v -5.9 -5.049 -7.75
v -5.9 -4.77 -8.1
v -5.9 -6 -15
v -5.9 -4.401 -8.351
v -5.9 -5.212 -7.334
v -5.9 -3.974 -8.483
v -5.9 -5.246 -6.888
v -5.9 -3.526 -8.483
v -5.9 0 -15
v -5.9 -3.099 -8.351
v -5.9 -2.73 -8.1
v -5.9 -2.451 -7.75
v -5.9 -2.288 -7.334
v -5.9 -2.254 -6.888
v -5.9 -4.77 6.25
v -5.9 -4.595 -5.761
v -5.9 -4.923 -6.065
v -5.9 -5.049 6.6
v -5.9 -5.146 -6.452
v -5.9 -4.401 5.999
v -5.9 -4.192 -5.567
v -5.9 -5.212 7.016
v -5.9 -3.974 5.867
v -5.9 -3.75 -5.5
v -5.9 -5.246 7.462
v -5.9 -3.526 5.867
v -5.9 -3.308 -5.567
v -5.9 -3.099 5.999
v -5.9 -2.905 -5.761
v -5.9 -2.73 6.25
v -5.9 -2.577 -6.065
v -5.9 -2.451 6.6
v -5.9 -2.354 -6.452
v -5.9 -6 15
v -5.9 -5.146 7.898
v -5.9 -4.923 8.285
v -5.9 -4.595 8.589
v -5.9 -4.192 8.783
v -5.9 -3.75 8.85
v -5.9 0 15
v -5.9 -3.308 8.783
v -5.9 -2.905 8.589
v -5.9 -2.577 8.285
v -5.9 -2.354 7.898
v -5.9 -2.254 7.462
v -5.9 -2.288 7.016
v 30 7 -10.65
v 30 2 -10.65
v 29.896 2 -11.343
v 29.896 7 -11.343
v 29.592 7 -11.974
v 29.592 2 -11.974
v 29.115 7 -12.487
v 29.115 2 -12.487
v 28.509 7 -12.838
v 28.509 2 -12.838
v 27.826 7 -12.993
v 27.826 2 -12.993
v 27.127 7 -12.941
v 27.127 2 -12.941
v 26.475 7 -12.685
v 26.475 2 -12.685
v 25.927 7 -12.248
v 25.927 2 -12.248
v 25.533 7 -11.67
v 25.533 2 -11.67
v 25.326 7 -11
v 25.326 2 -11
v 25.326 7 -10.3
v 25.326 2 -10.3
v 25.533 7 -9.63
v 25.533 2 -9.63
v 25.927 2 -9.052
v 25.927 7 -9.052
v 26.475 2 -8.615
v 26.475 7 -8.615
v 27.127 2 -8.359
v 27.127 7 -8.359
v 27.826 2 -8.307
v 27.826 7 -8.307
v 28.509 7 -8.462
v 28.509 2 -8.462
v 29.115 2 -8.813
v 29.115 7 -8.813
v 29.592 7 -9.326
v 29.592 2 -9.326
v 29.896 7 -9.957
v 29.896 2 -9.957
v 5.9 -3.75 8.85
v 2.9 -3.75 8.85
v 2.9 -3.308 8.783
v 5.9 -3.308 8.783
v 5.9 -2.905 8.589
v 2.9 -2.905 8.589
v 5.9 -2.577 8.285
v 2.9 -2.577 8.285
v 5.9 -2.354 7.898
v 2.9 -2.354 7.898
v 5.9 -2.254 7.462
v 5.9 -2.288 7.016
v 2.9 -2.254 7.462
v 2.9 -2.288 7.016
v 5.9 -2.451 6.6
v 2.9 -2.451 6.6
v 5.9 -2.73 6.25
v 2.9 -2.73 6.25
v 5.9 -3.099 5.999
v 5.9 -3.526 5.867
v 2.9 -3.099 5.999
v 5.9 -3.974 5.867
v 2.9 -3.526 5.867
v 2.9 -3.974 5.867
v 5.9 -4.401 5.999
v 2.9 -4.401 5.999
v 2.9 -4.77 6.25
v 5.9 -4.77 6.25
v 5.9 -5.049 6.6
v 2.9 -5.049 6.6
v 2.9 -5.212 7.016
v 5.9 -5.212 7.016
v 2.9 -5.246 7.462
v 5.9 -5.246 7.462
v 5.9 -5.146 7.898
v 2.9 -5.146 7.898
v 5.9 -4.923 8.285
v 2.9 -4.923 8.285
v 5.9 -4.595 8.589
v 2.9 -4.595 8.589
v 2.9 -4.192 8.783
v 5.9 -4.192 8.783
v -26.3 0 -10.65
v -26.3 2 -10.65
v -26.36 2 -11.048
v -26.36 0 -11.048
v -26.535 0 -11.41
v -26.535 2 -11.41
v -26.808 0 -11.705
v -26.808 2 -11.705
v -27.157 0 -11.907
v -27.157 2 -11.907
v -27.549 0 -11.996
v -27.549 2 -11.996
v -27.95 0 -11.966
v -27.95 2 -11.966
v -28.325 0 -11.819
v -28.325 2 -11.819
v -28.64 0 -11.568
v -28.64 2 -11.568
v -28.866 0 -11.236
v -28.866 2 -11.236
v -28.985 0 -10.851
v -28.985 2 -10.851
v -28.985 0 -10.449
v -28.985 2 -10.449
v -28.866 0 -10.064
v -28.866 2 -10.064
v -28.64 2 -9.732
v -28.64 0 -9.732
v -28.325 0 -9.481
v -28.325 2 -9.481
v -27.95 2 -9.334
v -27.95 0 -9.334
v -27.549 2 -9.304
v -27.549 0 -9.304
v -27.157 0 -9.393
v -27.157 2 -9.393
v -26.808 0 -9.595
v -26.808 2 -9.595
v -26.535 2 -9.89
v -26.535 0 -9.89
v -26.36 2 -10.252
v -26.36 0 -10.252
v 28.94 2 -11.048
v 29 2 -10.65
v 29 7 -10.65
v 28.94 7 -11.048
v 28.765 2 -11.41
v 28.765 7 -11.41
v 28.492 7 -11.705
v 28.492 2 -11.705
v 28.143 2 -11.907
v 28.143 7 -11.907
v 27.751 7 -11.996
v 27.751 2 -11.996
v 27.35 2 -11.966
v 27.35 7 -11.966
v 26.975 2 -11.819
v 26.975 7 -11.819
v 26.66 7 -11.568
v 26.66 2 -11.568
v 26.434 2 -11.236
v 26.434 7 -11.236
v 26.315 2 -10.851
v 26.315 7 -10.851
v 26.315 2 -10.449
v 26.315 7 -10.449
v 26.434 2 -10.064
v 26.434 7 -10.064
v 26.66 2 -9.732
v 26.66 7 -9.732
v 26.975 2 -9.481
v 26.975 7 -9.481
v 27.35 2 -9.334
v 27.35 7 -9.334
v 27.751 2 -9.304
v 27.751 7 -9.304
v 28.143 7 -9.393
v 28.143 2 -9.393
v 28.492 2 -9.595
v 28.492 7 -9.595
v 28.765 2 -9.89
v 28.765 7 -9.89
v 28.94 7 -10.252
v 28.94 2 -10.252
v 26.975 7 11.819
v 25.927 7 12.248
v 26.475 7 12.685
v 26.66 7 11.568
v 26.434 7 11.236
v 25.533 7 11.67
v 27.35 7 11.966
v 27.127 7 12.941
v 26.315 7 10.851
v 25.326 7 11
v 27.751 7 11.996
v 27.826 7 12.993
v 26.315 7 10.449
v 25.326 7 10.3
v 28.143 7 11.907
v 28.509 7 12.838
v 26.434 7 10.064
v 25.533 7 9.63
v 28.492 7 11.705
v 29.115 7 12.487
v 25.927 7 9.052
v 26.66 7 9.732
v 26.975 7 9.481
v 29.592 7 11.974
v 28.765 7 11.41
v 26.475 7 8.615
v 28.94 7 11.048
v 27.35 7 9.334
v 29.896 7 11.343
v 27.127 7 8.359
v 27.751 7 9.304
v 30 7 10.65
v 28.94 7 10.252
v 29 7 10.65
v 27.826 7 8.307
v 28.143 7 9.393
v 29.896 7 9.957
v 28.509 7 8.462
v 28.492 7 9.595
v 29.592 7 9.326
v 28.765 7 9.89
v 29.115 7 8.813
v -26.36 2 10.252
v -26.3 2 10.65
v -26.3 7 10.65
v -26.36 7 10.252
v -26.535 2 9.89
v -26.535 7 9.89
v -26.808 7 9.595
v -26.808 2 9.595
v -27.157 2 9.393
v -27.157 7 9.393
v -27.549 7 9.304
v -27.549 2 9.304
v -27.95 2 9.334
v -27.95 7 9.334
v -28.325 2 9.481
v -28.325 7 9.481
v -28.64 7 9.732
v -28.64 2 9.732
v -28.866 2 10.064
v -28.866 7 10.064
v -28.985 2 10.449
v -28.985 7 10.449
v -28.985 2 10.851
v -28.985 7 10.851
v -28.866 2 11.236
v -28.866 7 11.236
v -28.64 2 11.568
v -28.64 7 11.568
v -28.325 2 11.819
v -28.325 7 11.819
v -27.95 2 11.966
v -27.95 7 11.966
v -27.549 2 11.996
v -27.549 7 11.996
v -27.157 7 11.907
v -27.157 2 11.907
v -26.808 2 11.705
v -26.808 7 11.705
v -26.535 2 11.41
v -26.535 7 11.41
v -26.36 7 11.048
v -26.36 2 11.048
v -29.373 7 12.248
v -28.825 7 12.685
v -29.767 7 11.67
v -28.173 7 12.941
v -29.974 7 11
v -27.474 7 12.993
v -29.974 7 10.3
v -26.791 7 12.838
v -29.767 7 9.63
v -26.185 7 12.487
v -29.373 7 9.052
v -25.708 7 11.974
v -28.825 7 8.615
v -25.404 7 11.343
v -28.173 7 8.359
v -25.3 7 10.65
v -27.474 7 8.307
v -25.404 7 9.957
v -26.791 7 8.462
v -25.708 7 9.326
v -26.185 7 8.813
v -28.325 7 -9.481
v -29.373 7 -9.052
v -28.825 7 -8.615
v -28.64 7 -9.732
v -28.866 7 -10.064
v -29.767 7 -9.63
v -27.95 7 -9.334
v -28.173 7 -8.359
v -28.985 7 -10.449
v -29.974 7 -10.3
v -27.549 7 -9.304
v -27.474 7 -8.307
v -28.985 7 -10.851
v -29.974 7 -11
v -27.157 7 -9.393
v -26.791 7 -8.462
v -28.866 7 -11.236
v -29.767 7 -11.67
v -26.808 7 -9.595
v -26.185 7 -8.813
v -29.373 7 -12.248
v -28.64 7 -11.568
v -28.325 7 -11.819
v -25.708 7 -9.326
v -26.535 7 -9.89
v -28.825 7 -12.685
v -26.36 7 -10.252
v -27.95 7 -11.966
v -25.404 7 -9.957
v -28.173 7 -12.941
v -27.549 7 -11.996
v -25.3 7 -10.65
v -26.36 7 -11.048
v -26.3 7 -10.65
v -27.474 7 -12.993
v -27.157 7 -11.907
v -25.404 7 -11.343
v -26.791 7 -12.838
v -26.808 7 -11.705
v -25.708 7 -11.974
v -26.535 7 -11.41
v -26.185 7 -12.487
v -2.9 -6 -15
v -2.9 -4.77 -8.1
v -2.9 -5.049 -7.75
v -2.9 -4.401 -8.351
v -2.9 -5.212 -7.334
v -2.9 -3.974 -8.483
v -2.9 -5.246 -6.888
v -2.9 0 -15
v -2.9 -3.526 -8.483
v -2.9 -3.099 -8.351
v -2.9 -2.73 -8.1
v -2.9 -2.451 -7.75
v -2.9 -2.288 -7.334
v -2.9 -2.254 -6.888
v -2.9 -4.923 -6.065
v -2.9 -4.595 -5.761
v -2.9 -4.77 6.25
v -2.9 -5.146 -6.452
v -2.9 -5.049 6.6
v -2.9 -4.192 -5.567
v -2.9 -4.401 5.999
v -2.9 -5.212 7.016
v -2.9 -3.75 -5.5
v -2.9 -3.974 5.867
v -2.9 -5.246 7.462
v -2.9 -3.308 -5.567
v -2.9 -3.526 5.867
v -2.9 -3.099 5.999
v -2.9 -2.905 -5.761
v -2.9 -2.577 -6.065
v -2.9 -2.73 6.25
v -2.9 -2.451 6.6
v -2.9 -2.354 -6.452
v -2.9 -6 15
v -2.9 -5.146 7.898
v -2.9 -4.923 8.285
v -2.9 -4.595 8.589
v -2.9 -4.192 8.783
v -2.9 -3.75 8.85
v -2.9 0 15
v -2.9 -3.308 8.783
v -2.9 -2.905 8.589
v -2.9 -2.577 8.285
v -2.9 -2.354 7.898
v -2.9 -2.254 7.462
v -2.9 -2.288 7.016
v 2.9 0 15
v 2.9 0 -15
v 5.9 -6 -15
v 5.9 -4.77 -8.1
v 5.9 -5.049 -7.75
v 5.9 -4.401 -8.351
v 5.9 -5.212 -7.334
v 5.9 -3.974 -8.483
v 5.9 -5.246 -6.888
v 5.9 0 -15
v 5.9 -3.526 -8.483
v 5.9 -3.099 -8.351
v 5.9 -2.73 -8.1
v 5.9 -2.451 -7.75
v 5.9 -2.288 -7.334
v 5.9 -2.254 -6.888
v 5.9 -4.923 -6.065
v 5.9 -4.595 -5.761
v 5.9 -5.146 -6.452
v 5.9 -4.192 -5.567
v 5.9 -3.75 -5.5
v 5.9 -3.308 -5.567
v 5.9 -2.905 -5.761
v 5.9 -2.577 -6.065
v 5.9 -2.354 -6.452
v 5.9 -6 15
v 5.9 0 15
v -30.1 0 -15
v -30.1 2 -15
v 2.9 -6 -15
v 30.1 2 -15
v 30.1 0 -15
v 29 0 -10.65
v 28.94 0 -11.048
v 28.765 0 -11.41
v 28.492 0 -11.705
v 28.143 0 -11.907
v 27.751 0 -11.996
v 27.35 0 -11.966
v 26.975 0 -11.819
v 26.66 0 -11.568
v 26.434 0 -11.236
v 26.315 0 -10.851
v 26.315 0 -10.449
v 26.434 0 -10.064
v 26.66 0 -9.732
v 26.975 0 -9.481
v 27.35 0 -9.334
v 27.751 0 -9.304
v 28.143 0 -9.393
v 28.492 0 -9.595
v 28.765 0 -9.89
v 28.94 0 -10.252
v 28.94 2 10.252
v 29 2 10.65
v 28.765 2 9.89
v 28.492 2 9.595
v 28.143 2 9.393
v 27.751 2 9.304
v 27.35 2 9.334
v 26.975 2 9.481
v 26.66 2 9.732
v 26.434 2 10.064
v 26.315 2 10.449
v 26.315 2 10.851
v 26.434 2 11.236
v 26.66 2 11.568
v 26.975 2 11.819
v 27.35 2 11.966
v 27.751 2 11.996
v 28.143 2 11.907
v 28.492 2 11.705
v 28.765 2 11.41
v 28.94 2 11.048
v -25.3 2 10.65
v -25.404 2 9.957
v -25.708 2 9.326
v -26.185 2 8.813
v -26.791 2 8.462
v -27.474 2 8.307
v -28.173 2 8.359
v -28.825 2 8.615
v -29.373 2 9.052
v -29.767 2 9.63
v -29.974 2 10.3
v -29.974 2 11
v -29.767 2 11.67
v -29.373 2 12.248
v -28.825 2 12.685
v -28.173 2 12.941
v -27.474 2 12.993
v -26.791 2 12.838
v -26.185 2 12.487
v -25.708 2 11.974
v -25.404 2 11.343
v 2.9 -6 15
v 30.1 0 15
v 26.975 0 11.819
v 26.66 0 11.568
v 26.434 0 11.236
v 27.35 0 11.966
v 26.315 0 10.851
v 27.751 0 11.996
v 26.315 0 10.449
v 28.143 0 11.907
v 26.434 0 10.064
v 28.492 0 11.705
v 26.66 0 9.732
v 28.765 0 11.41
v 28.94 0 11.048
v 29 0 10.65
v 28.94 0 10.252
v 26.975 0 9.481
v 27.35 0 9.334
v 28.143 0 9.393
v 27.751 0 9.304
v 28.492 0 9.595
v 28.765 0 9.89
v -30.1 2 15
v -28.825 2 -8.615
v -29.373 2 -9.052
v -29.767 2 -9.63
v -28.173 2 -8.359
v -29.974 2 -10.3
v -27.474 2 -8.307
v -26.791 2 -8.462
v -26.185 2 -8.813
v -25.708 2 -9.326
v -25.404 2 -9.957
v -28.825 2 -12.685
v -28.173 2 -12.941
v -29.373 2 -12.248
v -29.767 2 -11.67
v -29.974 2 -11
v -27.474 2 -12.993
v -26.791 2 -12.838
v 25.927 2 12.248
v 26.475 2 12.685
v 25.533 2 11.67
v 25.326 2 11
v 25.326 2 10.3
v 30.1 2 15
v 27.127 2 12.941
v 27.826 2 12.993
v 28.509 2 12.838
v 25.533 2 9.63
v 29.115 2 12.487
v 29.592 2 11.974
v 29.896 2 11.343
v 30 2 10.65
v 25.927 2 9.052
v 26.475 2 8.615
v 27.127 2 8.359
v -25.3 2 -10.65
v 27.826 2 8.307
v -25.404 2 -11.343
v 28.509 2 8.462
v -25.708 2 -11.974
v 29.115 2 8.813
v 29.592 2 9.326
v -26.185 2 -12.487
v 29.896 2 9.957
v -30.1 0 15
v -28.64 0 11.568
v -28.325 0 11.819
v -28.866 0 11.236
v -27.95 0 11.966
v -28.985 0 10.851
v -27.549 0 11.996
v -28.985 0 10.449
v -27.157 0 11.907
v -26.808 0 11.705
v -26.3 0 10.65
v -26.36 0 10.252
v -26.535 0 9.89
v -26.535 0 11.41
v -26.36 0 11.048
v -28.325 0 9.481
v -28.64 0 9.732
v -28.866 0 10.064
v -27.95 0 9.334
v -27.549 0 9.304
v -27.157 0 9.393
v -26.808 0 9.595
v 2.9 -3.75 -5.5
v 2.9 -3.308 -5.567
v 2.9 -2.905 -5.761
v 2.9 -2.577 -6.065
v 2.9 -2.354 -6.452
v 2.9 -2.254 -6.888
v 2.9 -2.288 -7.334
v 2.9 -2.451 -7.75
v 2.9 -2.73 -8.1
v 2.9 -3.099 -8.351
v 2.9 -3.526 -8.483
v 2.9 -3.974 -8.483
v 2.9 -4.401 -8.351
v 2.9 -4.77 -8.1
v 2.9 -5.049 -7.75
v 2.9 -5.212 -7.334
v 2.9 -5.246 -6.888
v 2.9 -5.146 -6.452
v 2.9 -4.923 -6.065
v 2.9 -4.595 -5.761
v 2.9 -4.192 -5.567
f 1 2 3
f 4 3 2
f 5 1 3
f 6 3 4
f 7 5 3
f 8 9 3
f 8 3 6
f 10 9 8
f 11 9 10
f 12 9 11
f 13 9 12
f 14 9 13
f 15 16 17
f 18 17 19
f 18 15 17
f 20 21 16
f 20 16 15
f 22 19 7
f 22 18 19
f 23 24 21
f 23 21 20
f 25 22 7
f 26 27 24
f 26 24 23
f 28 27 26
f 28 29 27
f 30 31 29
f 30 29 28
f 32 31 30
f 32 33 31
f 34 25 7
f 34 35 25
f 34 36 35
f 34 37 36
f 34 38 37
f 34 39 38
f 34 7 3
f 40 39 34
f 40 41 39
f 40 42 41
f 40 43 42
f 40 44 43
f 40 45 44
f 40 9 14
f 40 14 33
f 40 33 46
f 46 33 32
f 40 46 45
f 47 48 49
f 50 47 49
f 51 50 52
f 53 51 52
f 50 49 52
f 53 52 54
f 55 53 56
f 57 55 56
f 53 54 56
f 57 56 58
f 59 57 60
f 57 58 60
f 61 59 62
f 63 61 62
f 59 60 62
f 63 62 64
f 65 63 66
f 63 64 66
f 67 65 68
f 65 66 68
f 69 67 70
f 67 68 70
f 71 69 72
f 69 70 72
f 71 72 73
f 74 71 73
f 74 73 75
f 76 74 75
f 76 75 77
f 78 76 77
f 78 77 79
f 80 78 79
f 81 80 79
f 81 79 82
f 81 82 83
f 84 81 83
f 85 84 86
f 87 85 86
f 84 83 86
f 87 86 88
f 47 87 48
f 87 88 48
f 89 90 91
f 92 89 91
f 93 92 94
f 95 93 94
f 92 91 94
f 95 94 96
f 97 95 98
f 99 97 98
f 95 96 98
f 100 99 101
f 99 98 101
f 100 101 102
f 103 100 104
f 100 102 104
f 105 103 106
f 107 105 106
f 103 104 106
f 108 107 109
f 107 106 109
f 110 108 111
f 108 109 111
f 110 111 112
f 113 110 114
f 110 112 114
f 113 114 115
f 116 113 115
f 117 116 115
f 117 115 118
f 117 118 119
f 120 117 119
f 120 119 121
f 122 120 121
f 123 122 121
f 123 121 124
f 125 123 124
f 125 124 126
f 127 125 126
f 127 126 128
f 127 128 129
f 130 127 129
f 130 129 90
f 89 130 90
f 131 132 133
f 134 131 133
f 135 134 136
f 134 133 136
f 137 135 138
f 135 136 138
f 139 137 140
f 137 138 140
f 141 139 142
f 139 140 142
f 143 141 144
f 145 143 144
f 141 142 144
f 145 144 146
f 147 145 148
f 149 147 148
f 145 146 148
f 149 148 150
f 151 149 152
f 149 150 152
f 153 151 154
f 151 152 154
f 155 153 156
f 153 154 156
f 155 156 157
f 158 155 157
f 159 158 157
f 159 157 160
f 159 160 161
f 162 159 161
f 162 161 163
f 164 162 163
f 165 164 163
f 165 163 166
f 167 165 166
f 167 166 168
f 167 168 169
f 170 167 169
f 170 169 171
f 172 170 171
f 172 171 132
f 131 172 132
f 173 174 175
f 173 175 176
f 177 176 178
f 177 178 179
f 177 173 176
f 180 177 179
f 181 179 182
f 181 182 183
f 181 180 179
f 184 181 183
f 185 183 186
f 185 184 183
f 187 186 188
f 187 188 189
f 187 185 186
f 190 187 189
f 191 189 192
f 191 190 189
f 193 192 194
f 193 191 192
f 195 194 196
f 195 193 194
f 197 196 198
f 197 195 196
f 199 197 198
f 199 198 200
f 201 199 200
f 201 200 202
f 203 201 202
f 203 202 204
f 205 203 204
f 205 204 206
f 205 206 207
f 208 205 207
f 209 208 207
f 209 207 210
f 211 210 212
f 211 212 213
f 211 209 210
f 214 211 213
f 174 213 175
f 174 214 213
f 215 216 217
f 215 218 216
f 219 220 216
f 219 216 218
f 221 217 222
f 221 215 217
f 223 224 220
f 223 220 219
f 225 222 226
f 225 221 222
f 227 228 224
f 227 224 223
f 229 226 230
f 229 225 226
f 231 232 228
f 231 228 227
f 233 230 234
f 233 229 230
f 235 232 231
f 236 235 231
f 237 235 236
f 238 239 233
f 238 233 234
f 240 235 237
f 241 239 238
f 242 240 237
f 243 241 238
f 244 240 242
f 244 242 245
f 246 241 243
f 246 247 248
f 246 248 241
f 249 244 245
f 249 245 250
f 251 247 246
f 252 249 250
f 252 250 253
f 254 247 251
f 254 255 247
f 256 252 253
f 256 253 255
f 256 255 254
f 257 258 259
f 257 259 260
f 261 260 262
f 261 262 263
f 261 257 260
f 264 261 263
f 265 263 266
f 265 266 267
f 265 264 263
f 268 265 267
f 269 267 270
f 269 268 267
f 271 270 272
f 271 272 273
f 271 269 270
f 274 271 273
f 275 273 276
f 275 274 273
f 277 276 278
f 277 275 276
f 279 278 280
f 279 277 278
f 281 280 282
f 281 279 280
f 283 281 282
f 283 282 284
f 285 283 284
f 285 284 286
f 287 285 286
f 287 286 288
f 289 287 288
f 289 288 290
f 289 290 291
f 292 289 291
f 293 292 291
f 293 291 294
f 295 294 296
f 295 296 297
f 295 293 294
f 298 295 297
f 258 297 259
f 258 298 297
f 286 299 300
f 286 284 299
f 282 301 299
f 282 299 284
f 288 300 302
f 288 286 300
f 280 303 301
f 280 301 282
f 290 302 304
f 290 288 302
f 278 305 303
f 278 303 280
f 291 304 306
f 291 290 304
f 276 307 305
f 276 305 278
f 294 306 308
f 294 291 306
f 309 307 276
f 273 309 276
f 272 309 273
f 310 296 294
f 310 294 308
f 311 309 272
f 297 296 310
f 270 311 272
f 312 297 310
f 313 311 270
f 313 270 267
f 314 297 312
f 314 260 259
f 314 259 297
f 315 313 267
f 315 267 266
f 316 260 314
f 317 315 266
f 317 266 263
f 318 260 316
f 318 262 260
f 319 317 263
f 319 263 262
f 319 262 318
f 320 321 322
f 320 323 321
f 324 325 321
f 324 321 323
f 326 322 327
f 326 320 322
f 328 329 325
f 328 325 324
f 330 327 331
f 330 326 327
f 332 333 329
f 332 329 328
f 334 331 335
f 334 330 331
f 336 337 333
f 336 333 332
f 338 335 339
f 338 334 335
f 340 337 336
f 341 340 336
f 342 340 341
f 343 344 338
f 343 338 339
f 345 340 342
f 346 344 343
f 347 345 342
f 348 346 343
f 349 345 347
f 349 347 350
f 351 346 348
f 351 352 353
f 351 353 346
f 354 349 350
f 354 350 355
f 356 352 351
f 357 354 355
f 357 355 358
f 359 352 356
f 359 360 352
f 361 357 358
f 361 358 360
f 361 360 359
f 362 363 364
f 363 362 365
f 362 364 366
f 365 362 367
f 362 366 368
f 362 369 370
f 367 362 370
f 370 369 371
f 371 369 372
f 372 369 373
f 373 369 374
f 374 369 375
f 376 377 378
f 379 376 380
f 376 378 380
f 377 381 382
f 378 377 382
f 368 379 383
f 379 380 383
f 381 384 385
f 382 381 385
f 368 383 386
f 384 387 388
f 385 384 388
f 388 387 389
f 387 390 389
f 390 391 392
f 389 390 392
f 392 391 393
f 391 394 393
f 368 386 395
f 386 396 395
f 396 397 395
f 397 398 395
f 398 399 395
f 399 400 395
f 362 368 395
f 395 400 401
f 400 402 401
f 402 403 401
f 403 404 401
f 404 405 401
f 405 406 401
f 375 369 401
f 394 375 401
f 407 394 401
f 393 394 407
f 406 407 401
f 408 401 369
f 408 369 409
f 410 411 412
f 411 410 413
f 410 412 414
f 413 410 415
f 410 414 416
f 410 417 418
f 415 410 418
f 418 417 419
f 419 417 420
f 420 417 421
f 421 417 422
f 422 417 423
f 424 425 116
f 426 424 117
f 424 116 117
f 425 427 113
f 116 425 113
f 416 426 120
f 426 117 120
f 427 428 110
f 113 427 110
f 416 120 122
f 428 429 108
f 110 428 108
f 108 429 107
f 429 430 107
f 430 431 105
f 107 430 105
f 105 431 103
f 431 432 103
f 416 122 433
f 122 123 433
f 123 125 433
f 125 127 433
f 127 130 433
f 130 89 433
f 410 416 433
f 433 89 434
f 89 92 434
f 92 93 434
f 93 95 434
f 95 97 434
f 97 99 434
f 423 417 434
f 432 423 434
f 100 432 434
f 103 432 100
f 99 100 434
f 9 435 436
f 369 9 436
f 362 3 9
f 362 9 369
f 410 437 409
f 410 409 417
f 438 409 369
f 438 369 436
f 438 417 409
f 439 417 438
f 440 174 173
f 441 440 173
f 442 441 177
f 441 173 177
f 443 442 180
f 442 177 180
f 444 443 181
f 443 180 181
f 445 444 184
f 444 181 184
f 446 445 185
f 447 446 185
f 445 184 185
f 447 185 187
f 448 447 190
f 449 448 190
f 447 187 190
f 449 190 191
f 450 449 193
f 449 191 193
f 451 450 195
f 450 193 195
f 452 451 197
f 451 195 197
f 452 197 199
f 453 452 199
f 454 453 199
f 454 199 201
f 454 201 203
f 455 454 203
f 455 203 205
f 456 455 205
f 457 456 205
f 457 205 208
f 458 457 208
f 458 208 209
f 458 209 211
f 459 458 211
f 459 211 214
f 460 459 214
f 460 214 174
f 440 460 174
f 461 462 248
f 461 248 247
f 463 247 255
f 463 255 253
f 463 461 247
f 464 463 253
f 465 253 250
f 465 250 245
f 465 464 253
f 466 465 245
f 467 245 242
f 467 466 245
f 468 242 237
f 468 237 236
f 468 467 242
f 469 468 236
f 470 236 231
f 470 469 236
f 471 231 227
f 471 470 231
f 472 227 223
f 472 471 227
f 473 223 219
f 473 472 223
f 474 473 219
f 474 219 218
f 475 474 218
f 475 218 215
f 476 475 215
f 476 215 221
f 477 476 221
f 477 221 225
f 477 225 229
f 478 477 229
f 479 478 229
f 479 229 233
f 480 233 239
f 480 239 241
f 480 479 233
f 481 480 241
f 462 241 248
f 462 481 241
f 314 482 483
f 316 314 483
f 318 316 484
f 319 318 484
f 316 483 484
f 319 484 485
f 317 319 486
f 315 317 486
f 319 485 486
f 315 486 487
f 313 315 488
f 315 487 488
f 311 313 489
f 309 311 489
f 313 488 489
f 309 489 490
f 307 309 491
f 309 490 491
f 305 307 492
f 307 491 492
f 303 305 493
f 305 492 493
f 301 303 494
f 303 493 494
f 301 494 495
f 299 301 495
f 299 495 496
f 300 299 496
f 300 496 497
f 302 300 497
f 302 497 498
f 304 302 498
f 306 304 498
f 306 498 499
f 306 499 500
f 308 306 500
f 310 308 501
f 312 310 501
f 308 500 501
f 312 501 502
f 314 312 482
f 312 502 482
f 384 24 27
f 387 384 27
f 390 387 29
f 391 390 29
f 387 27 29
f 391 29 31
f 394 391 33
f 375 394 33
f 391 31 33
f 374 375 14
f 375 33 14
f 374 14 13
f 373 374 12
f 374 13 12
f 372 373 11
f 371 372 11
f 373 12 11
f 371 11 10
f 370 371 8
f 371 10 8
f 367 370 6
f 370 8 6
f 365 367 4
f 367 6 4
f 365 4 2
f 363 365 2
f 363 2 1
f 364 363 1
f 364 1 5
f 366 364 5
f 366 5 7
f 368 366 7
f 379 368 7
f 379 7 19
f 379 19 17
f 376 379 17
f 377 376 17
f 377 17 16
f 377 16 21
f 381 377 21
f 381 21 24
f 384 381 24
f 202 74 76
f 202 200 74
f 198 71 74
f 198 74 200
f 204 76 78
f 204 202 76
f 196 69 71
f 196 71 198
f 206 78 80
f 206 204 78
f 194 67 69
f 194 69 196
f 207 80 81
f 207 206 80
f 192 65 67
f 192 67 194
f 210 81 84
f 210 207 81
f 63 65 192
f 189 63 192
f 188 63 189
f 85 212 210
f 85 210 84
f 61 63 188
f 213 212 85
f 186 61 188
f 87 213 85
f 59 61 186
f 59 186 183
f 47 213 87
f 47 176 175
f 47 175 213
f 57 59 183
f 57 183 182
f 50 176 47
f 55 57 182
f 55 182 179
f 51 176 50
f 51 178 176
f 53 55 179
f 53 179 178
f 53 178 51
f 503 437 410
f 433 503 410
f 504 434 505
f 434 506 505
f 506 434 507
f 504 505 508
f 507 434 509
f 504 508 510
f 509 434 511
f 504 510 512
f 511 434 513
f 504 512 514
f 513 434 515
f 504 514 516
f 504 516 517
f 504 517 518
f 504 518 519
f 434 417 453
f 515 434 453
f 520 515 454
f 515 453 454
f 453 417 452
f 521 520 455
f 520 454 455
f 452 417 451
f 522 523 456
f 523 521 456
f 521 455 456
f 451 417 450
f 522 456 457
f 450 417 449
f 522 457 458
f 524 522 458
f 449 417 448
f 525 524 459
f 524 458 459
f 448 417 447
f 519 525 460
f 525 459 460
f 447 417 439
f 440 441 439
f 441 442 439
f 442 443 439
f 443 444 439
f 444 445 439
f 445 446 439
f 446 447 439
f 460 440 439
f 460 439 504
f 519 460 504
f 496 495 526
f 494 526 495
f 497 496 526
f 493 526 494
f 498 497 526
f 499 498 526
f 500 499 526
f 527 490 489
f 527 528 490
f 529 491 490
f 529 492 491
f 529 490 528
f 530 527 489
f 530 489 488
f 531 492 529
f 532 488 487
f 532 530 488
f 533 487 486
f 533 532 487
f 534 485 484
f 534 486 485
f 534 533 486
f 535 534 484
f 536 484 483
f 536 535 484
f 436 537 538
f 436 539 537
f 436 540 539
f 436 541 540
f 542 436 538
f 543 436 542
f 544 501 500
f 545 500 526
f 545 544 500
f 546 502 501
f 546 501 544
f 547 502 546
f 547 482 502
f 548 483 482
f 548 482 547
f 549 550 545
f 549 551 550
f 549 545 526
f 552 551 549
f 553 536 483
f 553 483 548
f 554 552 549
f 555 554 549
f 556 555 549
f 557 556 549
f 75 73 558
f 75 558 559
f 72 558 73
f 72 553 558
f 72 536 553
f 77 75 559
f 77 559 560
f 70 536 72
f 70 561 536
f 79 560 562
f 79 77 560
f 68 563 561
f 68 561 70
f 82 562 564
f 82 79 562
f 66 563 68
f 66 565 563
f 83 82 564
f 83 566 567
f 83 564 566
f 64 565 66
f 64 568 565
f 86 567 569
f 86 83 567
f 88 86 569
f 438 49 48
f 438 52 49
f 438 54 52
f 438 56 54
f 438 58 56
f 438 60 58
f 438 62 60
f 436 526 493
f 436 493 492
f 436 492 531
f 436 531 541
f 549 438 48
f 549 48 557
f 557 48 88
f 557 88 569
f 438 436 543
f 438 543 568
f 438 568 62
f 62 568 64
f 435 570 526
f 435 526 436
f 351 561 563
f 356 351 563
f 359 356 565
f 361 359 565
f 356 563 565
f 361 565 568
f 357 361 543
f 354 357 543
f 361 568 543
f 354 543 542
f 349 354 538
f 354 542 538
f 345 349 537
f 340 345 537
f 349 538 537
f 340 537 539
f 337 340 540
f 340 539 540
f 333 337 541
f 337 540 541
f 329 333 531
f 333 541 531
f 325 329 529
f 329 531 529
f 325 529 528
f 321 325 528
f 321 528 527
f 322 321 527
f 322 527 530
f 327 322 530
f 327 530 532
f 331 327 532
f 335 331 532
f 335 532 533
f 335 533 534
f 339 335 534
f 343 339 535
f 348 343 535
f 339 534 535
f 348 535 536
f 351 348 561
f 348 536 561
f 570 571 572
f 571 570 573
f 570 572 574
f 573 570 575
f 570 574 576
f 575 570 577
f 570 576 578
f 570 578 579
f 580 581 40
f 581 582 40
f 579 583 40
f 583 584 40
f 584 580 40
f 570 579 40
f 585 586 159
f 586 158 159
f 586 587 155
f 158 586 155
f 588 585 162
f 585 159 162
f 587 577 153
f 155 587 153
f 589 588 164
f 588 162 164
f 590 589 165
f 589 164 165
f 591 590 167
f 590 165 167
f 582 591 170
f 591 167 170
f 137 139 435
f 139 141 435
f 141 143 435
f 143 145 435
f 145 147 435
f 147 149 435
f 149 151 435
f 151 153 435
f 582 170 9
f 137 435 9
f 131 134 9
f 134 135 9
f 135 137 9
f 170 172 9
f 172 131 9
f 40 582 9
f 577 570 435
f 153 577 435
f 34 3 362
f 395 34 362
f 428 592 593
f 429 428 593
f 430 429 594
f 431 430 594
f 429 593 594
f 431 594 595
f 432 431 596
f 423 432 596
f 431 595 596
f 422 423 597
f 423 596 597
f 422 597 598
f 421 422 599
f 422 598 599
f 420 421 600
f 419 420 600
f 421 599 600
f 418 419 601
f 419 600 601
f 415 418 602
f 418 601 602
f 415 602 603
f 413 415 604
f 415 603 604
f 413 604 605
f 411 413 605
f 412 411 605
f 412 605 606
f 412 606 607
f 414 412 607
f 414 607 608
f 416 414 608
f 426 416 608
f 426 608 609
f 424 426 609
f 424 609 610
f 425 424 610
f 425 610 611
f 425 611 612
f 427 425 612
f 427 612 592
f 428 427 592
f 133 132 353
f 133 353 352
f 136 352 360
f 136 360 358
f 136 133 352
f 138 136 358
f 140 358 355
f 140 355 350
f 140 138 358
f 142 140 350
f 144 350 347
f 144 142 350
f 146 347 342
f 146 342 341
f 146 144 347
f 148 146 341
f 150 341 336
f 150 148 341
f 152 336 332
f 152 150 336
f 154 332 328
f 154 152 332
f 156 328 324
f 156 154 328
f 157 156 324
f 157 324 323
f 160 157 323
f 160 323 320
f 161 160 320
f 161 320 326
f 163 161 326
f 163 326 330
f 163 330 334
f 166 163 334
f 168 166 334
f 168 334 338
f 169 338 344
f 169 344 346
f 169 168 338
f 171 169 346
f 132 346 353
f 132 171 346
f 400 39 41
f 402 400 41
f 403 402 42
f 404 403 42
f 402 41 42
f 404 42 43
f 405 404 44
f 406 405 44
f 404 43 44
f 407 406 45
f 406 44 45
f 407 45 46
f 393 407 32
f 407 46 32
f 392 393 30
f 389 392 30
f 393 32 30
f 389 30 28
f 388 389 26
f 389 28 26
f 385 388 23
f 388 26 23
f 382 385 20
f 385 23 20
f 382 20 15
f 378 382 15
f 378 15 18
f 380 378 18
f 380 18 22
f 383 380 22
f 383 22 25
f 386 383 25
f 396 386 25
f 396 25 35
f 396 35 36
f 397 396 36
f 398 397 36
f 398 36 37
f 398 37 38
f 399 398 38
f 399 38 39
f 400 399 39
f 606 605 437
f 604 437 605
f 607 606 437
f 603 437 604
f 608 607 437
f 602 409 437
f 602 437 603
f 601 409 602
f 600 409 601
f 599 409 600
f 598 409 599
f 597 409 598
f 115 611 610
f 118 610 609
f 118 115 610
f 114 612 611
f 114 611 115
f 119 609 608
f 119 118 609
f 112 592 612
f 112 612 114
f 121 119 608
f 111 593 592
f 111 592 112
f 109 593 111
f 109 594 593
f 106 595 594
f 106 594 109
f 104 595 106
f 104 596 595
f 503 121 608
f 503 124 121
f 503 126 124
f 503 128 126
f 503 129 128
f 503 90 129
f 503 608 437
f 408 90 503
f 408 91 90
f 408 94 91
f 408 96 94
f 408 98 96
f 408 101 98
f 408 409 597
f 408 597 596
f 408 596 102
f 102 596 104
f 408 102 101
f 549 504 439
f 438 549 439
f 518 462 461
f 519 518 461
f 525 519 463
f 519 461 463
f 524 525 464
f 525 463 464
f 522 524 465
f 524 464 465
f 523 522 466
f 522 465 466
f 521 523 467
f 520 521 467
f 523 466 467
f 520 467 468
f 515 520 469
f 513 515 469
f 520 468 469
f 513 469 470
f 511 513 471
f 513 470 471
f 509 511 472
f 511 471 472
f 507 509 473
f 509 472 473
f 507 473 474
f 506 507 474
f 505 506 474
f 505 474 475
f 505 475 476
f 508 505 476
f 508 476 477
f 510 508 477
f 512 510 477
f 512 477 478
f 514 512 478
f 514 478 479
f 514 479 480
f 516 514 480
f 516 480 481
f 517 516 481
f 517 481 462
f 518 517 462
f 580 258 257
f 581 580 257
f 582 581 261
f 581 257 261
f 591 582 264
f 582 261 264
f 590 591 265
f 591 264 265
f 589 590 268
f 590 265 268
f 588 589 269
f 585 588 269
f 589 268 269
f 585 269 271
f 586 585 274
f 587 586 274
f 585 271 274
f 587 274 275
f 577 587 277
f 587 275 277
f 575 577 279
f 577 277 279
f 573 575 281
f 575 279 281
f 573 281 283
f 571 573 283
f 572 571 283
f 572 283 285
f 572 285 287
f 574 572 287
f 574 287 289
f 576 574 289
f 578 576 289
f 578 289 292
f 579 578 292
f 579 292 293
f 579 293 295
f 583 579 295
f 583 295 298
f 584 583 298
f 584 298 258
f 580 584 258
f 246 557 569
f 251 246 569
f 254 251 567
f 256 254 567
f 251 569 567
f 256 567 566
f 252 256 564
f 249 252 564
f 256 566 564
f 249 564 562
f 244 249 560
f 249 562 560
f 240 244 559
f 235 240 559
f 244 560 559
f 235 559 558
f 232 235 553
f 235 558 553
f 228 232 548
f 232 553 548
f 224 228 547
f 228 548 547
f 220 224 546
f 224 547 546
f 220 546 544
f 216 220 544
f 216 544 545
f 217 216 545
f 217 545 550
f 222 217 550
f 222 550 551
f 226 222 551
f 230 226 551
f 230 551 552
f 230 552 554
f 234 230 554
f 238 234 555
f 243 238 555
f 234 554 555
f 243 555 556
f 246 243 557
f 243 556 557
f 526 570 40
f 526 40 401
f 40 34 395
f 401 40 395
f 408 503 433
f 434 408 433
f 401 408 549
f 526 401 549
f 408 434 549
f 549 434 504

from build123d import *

# Parameters (mm, degrees)
SKETCH_1_W          = 60.2
SKETCH_1_H          = 30
EXTRUDE_1_DEPTH     = 2
SKETCH_2_R          = 1.35
CUT_EXTRUDE_1_DEPTH = 3
SKETCH_3_R          = 2.35
SKETCH_3_R_2        = 1.35
EXTRUDE_2_DEPTH     = 5
SKETCH_4_W          = 3
SKETCH_4_H          = 30
EXTRUDE_3_DEPTH     = 6
SKETCH_5_R          = 1.5
CUT_EXTRUDE_2_DEPTH = 37


with BuildPart() as part:
    # 草图1 → 凸台-拉伸1 (new body)
    with BuildSketch(Plane(origin=(0, 0, 0), x_dir=(1, 0, 0), z_dir=(0, 1, 0))):
        Rectangle(SKETCH_1_W, SKETCH_1_H)
    extrude(amount=EXTRUDE_1_DEPTH)

    # 草图2 → 切除-拉伸1 (cut, through all)
    with BuildSketch(Plane(origin=(0, 2, 0), x_dir=(1, 0, 0), z_dir=(0, 1, 0))):
        with Locations((-27.65, 10.65)):
            Circle(SKETCH_2_R)
        with Locations((-27.65, -10.65)):
            Circle(SKETCH_2_R)
        with Locations((27.65, -10.65)):
            Circle(SKETCH_2_R)
        with Locations((27.65, 10.65)):
            Circle(SKETCH_2_R)
    extrude(amount=-CUT_EXTRUDE_1_DEPTH, mode=Mode.SUBTRACT)

    # 草图3 → 凸台-拉伸2 (add)
    with BuildSketch(Plane(origin=(0, 2, 0), x_dir=(1, 0, 0), z_dir=(0, 1, 0))):
        with Locations((-27.65, 10.65)):
            Circle(SKETCH_3_R)
        with Locations((-27.65, 10.65)):
            Circle(SKETCH_3_R_2, mode=Mode.SUBTRACT)
        with Locations((27.65, 10.65)):
            Circle(SKETCH_3_R)
        with Locations((27.65, 10.65)):
            Circle(SKETCH_3_R_2, mode=Mode.SUBTRACT)
        with Locations((27.65, -10.65)):
            Circle(SKETCH_3_R)
        with Locations((27.65, -10.65)):
            Circle(SKETCH_3_R_2, mode=Mode.SUBTRACT)
        with Locations((-27.65, -10.65)):
            Circle(SKETCH_3_R)
        with Locations((-27.65, -10.65)):
            Circle(SKETCH_3_R_2, mode=Mode.SUBTRACT)
    extrude(amount=EXTRUDE_2_DEPTH)

    # 草图4 → 凸台-拉伸3 (add)
    with BuildSketch(Plane.XZ):
        with Locations((4.4, 0)):
            Rectangle(SKETCH_4_W, SKETCH_4_H)
        with Locations((-4.4, 0)):
            Rectangle(SKETCH_4_W, SKETCH_4_H)
    extrude(amount=EXTRUDE_3_DEPTH)

    # 草图5 → 切除-拉伸2 (cut, through all)
    with BuildSketch(Plane.ZY.offset(5.9)):
        with Locations((-7, -3.75)):
            Circle(SKETCH_5_R)
        with Locations((7.35, -3.75)):
            Circle(SKETCH_5_R)
    extrude(amount=-CUT_EXTRUDE_2_DEPTH, mode=Mode.SUBTRACT)


solid = part.part
